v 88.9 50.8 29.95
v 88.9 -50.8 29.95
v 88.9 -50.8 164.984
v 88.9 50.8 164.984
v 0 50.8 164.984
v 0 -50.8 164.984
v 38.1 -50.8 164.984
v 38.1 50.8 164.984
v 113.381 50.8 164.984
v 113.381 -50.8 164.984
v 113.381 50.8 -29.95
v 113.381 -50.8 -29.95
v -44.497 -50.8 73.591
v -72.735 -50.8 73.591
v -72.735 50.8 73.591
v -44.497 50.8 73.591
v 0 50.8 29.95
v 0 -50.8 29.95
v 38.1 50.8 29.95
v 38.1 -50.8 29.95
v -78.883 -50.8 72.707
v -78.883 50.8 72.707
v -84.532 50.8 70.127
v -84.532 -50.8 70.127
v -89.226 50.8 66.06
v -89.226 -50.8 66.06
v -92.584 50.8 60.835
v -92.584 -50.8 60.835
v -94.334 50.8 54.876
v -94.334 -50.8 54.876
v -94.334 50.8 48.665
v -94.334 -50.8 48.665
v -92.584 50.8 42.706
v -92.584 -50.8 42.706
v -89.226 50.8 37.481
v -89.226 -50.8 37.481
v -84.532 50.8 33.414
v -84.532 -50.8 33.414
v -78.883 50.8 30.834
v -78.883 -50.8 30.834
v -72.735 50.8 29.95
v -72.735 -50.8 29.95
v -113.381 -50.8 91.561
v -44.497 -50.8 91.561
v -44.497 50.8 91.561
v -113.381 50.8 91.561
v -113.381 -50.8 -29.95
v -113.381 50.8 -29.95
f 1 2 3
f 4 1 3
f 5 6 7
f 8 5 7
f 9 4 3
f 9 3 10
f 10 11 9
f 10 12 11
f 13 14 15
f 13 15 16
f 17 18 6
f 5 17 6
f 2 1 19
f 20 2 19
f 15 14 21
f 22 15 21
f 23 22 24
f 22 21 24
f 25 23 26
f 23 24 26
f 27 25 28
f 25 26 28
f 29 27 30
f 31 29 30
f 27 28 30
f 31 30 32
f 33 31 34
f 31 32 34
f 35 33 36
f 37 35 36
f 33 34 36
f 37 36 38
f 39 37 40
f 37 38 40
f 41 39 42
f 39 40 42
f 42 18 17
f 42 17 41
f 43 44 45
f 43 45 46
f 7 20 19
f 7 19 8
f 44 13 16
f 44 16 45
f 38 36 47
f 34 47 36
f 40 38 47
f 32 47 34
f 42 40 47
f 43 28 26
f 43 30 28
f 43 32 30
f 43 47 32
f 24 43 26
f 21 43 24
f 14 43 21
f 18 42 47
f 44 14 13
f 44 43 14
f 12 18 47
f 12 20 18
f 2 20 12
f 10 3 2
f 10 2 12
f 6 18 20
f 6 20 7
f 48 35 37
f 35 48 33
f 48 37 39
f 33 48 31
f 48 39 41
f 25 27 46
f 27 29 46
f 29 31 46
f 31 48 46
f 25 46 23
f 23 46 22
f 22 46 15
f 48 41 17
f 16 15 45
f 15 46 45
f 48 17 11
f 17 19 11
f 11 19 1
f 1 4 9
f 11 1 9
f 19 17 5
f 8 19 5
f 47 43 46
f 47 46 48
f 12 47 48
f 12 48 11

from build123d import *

# Parameters (mm, degrees)
F0_W     = 24.481366
F0_H     = 135.034486
F0_W_2   = 38.1
F0_W_3   = 40.646148
F0_H_2   = 59.899588
F0_H_3   = 43.641134
F0_H_4   = 17.969872
F0_W_4   = 28.23838
F1_DEPTH = 50.8
F3_DEPTH = 176.784


with BuildPart() as f1:
    # F0 (on Front) → F1 (new body, symmetric)
    with BuildSketch(Plane.XZ):
        with Locations((101.140683, 97.467037)):
            Rectangle(F0_W, F0_H)
        with Locations((19.05, 97.467037)):
            Rectangle(F0_W_2, F0_H)
        Polygon((38.1, 29.949794), (0, 29.949794), (-72.735218, 29.949794), (-72.735218, -29.949794), (113.381366, -29.949794), (113.381366, 29.949794), (88.9, 29.949794), align=None)
        with Locations((-93.058292, 0)):
            Rectangle(F0_W_3, F0_H_2)
        with Locations((-93.058292, 51.770361)):
            Rectangle(F0_W_3, F0_H_3)
        with Locations((-93.058292, 82.575864)):
            Rectangle(F0_W_3, F0_H_4)
        with Locations((-58.616028, 82.575864)):
            Rectangle(F0_W_4, F0_H_4)
    extrude(amount=F1_DEPTH, both=True)

    # F2 (on face) → F3 (cut)
    with BuildSketch(Plane.XZ.offset(50.8)):
        with BuildLine():
            Line((-72.735218, 29.949794), (-72.735218, 73.590928))
            ThreePointArc((-72.735218, 73.590928), (-94.555785, 51.770361), (-72.735218, 29.949794))
        make_face()
    extrude(amount=-F3_DEPTH, mode=Mode.SUBTRACT)


solid = f1.part
